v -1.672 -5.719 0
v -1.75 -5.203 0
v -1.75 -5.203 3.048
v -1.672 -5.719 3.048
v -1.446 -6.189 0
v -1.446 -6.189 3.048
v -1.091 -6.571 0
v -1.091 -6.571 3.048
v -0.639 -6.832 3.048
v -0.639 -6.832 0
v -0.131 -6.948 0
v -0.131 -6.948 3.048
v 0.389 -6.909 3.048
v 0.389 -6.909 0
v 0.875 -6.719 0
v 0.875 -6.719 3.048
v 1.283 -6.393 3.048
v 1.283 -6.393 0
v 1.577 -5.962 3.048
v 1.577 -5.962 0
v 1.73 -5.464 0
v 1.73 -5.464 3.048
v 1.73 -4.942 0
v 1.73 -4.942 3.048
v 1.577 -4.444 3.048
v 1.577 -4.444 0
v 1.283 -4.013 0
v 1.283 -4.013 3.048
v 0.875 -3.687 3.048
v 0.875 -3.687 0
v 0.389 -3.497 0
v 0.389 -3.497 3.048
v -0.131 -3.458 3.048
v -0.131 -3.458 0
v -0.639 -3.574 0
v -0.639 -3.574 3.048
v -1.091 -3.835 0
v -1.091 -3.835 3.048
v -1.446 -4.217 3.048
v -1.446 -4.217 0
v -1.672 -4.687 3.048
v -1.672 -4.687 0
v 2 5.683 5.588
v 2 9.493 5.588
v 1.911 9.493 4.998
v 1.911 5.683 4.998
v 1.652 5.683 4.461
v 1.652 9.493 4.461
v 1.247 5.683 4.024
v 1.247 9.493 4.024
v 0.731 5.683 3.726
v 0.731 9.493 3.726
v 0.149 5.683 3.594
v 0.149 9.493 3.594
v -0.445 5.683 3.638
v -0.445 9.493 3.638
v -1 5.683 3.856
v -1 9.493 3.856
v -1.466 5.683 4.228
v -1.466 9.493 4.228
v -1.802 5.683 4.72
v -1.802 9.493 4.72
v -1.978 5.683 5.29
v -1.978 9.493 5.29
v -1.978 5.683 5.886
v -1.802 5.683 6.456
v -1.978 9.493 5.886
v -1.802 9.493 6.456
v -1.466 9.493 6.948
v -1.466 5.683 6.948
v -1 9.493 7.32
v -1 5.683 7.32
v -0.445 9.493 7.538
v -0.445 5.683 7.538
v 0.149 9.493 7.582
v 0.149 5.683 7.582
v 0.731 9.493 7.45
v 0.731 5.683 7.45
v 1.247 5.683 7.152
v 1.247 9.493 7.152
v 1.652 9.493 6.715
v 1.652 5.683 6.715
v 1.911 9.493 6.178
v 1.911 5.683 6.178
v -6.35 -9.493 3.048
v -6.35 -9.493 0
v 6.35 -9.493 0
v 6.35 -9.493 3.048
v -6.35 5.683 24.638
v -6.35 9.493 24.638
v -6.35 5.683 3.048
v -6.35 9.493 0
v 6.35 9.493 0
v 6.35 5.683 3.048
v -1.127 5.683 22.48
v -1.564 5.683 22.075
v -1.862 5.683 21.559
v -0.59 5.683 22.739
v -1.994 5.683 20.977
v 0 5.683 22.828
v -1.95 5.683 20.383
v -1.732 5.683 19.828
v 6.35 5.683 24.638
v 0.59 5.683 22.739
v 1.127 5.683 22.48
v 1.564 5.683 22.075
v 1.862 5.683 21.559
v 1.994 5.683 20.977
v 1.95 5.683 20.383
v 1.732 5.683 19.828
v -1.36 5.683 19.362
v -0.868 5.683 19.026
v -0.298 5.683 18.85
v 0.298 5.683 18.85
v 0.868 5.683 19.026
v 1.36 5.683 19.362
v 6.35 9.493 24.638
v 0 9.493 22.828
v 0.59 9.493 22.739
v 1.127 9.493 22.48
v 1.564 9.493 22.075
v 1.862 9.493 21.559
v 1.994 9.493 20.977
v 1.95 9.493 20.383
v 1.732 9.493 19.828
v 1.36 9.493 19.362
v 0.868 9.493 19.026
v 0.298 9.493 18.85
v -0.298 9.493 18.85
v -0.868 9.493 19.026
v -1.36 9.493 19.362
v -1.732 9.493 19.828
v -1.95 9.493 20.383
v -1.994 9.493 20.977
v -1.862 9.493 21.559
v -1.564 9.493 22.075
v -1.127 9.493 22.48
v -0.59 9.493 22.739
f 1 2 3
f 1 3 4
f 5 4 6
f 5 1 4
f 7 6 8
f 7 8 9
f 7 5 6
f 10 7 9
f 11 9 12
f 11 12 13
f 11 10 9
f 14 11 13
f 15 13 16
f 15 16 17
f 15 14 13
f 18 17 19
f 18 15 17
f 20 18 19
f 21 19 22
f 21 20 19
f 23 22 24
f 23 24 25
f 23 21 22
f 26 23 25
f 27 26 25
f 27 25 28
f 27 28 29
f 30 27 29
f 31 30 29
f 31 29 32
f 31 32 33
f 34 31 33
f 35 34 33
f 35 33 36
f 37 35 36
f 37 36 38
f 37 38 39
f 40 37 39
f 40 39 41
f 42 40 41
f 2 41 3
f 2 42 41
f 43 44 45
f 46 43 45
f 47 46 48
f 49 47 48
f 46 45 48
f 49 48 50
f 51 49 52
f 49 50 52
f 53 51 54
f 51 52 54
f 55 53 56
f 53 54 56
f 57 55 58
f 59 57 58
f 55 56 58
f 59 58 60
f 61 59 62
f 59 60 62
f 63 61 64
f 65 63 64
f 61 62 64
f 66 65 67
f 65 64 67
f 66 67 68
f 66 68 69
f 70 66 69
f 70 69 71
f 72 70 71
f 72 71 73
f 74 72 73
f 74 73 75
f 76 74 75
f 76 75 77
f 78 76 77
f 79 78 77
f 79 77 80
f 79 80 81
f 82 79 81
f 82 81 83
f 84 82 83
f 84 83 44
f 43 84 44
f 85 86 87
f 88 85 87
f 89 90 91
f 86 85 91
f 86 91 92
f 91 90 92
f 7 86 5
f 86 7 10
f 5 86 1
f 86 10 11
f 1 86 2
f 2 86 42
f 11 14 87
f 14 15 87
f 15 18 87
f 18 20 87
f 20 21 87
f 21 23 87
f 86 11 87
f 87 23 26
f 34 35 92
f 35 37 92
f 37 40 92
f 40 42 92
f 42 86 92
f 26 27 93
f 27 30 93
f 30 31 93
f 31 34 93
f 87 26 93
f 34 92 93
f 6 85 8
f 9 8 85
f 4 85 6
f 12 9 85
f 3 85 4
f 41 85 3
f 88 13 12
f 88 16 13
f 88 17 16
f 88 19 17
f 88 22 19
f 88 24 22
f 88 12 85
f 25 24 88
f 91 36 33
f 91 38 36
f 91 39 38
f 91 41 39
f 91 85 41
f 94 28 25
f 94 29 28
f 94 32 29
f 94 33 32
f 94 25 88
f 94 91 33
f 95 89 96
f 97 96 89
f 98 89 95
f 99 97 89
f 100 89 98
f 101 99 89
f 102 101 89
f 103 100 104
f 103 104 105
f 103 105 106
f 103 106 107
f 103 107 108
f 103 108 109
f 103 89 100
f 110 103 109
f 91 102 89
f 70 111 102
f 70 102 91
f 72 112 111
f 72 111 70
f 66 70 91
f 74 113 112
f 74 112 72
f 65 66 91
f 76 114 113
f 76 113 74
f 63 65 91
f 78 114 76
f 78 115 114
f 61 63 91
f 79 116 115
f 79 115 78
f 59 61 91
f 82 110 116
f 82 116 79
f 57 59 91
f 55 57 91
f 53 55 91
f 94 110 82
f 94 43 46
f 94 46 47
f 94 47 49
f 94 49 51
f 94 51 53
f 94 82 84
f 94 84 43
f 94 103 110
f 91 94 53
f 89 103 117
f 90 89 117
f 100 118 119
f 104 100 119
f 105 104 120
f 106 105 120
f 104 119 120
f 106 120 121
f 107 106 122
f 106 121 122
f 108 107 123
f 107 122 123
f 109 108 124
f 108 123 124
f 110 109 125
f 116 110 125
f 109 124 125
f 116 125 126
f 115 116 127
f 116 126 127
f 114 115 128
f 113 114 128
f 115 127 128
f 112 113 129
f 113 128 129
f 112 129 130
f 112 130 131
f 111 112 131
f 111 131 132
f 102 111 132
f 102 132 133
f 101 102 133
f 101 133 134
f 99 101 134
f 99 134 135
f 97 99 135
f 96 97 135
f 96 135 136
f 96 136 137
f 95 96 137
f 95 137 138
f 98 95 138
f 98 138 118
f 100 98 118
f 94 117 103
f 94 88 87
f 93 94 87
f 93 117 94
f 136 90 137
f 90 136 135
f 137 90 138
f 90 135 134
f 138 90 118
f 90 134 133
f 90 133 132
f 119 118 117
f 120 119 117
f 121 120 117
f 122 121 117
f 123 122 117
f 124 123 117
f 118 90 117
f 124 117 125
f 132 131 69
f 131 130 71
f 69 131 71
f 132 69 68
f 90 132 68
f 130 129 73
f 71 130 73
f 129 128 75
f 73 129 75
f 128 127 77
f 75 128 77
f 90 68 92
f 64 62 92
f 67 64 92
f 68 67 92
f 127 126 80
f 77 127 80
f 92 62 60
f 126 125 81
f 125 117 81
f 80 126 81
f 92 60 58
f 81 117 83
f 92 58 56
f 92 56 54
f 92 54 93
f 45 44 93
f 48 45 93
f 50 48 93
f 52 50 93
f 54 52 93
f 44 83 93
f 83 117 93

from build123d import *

# Parameters (mm, degrees)
SKETCH1_W           = 12.7
SKETCH1_H           = 18.986000128
SKETCH1_R           = 1.75
BOSS_EXTRUDE1_DEPTH = 3.048
SKETCH3_W           = 21.59
SKETCH3_H           = 3.81
BOSS_EXTRUDE2_DEPTH = 12.7
SKETCH4_R           = 2
CUT_EXTRUDE1_DEPTH  = 32.746208354


with BuildPart() as part:
    # Sketch1 → Boss-Extrude1 (new body)
    with BuildSketch(Plane.XY):
        Rectangle(SKETCH1_W, SKETCH1_H)
        with Locations(Location((0, -5.203000064, 0), (0, 0, 180))):
            Circle(SKETCH1_R, mode=Mode.SUBTRACT)
    extrude(amount=BOSS_EXTRUDE1_DEPTH)

    # Sketch3 → Boss-Extrude2 (add, through all)
    with BuildSketch(Plane(origin=(6.35, 0, 0), x_dir=(0, 0, -1), z_dir=(1, 0, 0))):
        with Locations((-13.843, 7.588000064)):
            Rectangle(SKETCH3_W, SKETCH3_H)
    extrude(amount=-BOSS_EXTRUDE2_DEPTH)

    # Sketch4 → Cut-Extrude1 (cut, through all)
    with BuildSketch(Plane(origin=(0, 9.493000064, 0), x_dir=(1, 0, 0), z_dir=(0, 1, 0))):
        with Locations(Location((0, -20.828, 0), (0, 0, 270))):
            Circle(SKETCH4_R)
        with Locations((0, -5.588)):
            Circle(SKETCH4_R)
    extrude(amount=-CUT_EXTRUDE1_DEPTH, mode=Mode.SUBTRACT)


solid = part.part
